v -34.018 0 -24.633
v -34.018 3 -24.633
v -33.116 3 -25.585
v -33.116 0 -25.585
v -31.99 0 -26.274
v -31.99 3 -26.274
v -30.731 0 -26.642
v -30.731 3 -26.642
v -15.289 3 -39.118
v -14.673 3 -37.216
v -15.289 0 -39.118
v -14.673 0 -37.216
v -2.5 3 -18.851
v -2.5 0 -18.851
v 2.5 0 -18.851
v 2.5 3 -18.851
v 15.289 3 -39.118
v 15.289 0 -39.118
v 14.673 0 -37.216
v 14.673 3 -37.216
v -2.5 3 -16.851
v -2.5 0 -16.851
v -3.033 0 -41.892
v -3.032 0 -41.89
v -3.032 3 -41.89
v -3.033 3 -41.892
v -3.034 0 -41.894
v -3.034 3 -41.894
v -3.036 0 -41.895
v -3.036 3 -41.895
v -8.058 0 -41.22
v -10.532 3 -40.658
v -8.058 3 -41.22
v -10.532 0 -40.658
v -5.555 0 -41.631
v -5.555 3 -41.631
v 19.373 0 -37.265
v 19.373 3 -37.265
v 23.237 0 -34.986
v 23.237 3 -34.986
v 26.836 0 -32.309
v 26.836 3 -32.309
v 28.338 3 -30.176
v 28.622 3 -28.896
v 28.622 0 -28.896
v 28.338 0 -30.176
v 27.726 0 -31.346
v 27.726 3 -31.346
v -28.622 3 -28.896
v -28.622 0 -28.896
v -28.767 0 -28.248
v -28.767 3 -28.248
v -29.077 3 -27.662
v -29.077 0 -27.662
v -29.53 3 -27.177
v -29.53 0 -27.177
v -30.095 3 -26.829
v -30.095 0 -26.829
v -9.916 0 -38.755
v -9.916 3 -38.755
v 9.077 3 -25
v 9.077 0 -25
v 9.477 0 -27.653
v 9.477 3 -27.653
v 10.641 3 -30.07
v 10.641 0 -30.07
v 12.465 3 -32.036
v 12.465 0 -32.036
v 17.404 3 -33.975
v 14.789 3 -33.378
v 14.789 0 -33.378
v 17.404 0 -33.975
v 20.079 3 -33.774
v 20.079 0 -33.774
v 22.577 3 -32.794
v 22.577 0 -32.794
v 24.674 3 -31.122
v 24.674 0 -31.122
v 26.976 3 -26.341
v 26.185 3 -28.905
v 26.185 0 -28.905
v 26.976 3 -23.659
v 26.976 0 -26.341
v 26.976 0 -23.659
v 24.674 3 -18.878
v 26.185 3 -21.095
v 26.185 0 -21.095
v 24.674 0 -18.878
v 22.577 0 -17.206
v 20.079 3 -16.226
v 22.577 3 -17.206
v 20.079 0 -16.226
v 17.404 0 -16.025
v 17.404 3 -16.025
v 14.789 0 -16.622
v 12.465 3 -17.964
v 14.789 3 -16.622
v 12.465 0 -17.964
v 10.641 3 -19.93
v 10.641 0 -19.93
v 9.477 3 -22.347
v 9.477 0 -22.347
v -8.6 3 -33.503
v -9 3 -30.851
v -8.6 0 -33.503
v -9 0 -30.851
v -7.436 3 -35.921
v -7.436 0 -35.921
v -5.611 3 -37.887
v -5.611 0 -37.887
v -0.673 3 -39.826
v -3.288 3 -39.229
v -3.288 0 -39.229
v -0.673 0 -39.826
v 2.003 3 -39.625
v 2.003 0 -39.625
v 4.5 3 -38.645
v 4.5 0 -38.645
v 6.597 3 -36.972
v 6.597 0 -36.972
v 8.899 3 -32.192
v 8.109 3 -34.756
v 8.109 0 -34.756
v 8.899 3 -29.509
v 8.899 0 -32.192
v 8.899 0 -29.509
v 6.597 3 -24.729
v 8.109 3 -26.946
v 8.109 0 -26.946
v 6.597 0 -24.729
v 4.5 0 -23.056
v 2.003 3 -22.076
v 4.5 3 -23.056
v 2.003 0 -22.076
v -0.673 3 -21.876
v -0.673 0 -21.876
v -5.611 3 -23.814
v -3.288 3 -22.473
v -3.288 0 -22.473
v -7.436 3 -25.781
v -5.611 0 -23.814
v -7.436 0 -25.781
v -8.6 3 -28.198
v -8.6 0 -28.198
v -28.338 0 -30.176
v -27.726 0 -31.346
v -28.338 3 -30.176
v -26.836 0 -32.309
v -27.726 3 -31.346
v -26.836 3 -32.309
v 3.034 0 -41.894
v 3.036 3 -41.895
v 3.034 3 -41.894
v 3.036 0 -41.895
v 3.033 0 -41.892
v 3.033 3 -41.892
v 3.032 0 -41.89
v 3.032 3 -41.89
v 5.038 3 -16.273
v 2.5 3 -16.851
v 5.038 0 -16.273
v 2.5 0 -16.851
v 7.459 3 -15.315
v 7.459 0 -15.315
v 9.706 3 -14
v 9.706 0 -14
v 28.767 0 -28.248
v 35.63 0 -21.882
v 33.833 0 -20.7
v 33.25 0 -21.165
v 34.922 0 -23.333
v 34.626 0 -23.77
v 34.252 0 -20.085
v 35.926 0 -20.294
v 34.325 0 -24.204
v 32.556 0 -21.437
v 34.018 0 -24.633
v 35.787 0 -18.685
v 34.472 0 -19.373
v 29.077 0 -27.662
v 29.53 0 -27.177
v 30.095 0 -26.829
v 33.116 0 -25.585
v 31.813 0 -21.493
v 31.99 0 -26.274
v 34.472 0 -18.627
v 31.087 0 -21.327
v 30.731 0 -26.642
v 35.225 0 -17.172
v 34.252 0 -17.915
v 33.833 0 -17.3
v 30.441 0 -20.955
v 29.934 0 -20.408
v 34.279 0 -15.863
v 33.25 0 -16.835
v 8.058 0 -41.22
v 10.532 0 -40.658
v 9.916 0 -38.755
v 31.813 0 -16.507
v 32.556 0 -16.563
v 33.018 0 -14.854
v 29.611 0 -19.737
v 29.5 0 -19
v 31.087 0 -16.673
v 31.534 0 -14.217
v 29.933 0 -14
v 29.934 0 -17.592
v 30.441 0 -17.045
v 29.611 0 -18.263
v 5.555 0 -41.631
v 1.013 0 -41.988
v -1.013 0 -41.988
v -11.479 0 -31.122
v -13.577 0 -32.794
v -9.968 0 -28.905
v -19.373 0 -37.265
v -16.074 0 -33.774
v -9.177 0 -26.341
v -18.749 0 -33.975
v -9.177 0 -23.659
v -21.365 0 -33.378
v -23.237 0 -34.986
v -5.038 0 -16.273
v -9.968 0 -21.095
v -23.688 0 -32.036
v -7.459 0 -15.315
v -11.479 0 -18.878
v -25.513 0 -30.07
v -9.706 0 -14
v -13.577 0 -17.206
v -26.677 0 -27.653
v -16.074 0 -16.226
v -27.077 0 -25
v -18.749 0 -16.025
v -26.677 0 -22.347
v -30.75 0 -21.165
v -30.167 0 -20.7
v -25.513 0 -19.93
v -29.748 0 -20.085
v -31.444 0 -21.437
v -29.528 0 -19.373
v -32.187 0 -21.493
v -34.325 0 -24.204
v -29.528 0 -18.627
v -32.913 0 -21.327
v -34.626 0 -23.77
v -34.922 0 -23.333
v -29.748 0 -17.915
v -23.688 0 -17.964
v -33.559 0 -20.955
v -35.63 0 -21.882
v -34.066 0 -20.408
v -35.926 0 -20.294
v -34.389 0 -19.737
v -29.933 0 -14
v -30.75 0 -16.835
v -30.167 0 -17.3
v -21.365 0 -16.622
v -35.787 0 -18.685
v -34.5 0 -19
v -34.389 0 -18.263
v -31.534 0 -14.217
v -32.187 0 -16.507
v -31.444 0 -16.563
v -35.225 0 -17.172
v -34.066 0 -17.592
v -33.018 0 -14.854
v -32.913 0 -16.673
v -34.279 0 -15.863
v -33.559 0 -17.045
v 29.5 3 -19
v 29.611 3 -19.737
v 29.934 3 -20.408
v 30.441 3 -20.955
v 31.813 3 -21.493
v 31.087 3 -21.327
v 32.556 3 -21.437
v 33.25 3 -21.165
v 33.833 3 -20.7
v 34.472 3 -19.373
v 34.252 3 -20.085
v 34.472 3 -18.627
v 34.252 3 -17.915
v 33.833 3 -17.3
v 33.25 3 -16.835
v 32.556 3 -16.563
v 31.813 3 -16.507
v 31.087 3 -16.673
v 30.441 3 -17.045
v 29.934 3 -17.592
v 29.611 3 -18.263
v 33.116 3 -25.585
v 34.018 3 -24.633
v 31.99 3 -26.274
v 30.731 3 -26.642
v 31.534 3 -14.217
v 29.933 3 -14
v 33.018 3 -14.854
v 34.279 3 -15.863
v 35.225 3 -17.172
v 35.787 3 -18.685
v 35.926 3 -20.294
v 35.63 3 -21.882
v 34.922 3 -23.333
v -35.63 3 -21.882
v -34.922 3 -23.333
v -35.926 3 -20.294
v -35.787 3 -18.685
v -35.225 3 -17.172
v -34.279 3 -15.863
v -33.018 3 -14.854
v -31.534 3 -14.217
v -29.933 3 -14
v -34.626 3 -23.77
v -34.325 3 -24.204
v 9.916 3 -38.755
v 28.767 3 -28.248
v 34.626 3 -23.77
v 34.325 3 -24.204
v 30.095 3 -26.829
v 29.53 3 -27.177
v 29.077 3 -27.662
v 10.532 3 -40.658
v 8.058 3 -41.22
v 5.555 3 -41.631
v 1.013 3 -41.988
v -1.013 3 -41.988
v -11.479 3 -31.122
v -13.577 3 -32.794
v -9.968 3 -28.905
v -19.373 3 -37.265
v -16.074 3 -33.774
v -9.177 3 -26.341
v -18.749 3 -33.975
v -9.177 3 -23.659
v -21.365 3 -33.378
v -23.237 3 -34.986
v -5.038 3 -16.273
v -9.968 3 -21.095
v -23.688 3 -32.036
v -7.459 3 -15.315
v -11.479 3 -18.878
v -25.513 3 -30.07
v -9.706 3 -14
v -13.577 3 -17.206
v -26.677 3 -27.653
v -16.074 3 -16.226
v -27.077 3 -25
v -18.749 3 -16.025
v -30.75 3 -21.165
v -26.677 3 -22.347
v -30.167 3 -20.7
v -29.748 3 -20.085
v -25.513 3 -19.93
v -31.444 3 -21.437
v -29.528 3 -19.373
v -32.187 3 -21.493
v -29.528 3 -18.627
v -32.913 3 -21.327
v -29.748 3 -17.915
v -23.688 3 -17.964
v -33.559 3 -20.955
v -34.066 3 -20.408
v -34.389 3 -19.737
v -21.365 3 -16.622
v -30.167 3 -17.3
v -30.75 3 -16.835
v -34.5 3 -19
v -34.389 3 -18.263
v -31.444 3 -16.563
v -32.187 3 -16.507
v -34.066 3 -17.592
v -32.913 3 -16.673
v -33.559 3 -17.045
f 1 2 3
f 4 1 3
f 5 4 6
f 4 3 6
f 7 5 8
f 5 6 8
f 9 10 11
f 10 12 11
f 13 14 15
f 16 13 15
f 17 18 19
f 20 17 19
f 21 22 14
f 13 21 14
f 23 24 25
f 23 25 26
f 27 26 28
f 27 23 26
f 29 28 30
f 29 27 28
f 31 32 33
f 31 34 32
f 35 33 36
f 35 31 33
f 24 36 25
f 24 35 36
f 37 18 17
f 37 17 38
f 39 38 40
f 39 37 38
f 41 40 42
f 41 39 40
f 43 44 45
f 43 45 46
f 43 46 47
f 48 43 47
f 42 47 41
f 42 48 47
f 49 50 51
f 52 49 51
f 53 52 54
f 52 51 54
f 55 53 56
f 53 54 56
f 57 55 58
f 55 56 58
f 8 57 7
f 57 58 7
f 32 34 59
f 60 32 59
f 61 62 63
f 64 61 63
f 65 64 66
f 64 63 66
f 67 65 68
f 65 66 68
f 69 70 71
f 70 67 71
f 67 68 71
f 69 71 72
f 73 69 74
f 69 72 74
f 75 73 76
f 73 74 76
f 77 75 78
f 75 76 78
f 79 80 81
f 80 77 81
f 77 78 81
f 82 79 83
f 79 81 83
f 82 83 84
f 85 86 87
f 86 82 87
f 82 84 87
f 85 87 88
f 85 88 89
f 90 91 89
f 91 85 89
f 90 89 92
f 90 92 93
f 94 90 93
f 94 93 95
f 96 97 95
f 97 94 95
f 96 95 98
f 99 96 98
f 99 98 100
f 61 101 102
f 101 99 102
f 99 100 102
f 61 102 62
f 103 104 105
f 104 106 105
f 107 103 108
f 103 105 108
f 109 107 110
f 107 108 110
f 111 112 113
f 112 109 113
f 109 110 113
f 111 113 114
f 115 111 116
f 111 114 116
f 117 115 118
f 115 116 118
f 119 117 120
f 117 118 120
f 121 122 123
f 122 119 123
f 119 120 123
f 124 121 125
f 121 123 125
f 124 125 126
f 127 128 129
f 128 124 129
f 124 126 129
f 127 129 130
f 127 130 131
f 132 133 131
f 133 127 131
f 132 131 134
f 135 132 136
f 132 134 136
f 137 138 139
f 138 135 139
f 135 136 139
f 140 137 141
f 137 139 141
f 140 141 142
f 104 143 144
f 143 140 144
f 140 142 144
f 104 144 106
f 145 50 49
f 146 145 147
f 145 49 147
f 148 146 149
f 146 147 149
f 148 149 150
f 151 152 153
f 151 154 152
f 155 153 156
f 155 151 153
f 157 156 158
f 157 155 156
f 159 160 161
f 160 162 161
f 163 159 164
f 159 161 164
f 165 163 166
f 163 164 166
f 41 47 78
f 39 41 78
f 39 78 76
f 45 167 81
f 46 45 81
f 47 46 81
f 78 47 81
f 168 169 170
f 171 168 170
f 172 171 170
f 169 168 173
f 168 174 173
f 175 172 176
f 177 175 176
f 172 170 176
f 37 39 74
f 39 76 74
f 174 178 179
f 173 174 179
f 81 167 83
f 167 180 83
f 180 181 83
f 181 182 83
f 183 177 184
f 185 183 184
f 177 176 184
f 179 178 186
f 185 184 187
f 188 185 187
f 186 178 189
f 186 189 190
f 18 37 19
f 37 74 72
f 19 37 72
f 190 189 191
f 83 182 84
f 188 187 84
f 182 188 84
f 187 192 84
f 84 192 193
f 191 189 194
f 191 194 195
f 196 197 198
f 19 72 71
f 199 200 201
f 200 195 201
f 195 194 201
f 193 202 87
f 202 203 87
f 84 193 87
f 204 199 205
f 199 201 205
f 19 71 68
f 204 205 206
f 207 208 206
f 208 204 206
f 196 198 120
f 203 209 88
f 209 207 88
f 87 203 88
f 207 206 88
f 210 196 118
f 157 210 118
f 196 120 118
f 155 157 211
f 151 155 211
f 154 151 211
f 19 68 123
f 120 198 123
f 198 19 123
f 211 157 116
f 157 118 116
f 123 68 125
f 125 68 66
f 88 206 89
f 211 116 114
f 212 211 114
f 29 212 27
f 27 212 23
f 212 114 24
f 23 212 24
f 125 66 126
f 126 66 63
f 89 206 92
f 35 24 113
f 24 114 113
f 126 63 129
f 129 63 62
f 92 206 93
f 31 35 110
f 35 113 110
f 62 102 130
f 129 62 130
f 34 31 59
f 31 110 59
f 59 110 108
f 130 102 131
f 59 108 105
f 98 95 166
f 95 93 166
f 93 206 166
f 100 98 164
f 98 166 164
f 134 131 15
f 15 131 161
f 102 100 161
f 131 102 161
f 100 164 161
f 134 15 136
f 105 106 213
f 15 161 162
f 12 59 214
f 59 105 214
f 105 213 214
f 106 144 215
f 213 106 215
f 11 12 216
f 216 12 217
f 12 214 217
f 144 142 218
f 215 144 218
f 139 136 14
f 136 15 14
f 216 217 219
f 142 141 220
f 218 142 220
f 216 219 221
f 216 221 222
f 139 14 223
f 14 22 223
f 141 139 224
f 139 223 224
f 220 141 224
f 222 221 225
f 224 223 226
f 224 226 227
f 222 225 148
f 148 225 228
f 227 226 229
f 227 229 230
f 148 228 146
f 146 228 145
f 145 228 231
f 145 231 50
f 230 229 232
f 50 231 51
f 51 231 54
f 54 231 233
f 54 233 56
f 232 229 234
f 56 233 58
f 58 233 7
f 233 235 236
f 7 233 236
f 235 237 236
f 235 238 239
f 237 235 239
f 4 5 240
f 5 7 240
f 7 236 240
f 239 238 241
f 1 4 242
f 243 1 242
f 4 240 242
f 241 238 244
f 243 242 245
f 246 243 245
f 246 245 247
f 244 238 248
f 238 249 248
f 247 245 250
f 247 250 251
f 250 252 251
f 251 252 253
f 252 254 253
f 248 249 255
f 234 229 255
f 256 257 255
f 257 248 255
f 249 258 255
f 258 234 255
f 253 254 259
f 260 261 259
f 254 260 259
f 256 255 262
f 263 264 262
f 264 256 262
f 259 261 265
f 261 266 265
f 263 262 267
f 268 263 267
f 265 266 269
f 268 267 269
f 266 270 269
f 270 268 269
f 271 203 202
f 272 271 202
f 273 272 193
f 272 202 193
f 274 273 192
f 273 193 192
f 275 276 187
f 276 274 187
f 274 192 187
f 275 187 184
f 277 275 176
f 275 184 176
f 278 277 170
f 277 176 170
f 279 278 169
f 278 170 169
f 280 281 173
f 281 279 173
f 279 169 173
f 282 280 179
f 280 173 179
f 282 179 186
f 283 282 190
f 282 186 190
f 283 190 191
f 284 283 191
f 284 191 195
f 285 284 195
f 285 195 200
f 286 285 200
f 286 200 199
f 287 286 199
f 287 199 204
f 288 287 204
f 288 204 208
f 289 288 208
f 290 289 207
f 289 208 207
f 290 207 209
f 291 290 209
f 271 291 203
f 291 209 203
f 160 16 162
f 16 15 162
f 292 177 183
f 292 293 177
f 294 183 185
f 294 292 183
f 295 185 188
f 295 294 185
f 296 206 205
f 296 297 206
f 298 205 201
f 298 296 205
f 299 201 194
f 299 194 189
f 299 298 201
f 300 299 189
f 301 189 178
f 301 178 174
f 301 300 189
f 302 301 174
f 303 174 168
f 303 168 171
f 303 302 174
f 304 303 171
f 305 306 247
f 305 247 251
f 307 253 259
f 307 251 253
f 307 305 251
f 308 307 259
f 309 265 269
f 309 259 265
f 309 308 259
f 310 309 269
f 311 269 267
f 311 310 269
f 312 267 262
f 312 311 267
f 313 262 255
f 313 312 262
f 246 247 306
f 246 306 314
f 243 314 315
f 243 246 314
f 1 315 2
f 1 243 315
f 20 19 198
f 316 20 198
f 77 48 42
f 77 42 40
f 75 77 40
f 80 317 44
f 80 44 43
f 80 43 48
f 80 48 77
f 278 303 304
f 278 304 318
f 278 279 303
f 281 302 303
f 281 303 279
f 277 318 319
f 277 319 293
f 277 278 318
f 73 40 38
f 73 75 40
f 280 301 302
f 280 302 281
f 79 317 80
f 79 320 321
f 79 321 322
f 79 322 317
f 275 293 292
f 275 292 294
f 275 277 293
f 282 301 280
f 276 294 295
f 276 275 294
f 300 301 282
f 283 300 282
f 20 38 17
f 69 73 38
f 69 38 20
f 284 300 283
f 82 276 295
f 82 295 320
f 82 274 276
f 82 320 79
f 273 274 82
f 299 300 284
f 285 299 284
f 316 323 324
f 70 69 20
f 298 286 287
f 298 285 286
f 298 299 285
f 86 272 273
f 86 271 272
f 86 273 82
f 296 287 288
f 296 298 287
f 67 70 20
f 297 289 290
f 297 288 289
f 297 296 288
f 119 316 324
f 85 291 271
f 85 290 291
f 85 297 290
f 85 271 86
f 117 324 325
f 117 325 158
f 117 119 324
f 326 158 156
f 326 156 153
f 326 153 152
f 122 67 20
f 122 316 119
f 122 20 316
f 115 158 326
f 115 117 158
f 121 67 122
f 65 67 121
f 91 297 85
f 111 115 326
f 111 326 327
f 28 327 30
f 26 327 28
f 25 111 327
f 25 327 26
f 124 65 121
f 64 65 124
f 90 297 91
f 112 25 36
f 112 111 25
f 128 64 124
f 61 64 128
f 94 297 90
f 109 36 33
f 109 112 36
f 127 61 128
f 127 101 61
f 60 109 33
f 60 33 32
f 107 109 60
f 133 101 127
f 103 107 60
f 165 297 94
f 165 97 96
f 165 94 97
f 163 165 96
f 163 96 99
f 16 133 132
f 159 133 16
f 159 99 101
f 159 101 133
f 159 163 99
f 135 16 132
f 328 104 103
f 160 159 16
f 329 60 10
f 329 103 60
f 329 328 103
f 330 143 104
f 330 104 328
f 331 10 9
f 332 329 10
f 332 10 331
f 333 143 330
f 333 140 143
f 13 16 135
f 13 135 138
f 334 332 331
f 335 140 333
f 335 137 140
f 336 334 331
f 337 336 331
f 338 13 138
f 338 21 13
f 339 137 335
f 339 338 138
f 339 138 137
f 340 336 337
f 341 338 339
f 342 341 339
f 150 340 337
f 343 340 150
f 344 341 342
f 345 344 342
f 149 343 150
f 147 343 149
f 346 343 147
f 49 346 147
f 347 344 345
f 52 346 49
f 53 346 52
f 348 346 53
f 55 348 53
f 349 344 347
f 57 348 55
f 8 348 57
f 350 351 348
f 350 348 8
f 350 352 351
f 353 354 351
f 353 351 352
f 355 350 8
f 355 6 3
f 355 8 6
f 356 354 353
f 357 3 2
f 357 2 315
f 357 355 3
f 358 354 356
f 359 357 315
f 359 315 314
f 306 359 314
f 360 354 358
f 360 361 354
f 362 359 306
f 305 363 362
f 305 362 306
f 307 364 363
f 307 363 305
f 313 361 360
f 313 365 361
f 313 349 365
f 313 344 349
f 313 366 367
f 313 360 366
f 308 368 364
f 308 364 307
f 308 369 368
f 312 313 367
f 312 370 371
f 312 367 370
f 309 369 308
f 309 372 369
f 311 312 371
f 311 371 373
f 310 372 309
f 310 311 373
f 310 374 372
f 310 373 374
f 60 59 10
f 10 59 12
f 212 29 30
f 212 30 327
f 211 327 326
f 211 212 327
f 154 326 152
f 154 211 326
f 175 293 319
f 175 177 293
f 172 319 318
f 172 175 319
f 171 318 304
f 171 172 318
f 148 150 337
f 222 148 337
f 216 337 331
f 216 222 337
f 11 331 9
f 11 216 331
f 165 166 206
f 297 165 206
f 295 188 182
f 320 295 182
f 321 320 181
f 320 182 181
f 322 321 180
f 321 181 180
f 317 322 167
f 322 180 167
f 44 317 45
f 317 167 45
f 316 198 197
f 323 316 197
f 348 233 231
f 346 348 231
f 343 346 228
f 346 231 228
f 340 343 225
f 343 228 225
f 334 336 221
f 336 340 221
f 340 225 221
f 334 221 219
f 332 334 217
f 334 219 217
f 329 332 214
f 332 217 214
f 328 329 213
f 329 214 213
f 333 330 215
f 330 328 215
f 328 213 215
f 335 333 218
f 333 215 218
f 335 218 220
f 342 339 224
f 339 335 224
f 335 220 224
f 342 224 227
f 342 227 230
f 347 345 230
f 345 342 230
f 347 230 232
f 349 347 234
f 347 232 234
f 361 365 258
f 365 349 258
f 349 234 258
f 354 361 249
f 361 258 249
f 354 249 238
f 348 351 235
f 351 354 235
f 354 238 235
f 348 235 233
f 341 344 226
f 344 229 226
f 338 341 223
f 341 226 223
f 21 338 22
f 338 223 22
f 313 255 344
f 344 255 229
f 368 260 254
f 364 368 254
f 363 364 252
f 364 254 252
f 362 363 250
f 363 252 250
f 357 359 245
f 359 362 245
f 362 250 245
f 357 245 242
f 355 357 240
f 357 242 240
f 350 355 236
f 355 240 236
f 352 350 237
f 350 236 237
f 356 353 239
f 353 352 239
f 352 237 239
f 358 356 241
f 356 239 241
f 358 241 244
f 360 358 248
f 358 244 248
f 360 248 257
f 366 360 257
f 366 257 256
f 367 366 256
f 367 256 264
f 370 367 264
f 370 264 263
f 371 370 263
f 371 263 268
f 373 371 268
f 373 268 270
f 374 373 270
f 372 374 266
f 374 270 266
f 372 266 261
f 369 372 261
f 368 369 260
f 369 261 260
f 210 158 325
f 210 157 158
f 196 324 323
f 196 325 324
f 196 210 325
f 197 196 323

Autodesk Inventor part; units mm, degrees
ref_plane "YZ Plane" through (0, 0, 0) normal (1, 0, 0) x (0, 1, 0)
ref_plane "XZ Plane" through (0, 0, 0) normal (0, 1, 0) x (-1, 0, 0)
ref_plane "XY Plane" through (0, 0, 0) normal (0, 0, 1) x (1, 0, 0)
sketch "Эскиз1" plane through (0, 0, 0) normal (0, 1, 0) x (-1, 0, 0)
  circle A0 centre (0, 0) radius 42
  line L0 (0, -42) -> (0, 42) construction
  circle A1 centre (18.0767, -25) radius 9
  circle A2 centre (-18.0767, -25) radius 9
  line L1 (39.598, -14) -> (-39.598, -14)
  circle A3 centre (0, -30.8507) radius 9
  circle A4 centre (0, 0) radius 30.8507 construction
  line L2 (0, 0) -> (12.9332, -39.9591) construction
  line L3 (0, 0) -> (-12.9332, -39.9591) construction
  line L4 (9.9159, -38.7553) -> (14.673, -37.2156)
  line L5 (14.673, -37.2156) -> (15.2888, -39.1184)
  line L6 (15.2888, -39.1184) -> (10.5318, -40.6581)
  line L7 (10.5318, -40.6581) -> (9.9159, -38.7553)
  line L8 (9.9159, -38.7553) -> (15.2888, -39.1184) construction
  line L9 (14.673, -37.2156) -> (10.5318, -40.6581) construction
  line L10 (-14.673, -37.2156) -> (-9.9159, -38.7553)
  line L11 (-9.9159, -38.7553) -> (-10.5318, -40.6581)
  line L12 (-10.5318, -40.6581) -> (-15.2888, -39.1184)
  line L13 (-15.2888, -39.1184) -> (-14.673, -37.2156)
  line L14 (-14.673, -37.2156) -> (-10.5318, -40.6581) construction
  line L15 (-9.9159, -38.7553) -> (-15.2888, -39.1184) construction
  line L16 (-2.5, -16.8507) -> (2.5, -16.8507)
  line L17 (2.5, -16.8507) -> (2.5, -18.8507)
  line L18 (2.5, -18.8507) -> (-2.5, -18.8507)
  line L19 (-2.5, -18.8507) -> (-2.5, -16.8507)
  line L20 (-2.5, -16.8507) -> (2.5, -18.8507) construction
  line L21 (2.5, -16.8507) -> (-2.5, -18.8507) construction
  circle A5 centre (0, 0) radius 17.0352
  circle A6 centre (0, -44.5) radius 2.5
  circle A7 centre (0, 0) radius 50
  circle A8 centre (0, -44.5) radius 4
  circle A9 centre (-32, -19) radius 2.5
  circle A10 centre (32, -19) radius 2.5
  circle A11 centre (0, 0) radius 44 construction
  circle A12 centre (0, 2) radius 44
  circle A13 centre (31.1127, -29.1127) radius 2.5
  circle A14 centre (-31.1127, -29.1127) radius 2.5
  point P0 (12.6024, -38.9369)
  point P1 (-12.6024, -38.9369)
  point P2 (0, -17.8507)
  point P3 (9.7056, -14)
  point P4 (2.5, -16.8507)
  point P5 (-9.7056, -14)
  point P6 (-15.2888, -39.1184)
  point P7 (10.5318, -40.6581)
  point P8 (-3.0315, -41.8904)
  point P9 (3.0315, -41.8904)
  point P10 (0, -42)
  point P11 (28.9734, -30.4063)
  point P12 (32.2615, -26.8923)
  point P13 (-32.2615, -26.8923)
  point P14 (-28.9734, -30.4063)
  dimension "d0" = 84
  dimension "d5" = 18
  dimension "d7" = 14
  dimension "d8" = 11
  dimension "d13" = 35.87
  dimension "d14" = 17.935
  dimension "d15" = 2
  dimension "d16" = 2
  dimension "d17" = 5
  dimension "d18" = 5
  dimension "d19" = 5
  dimension "d20" = 2
  dimension "d21" = 13
  dimension "d27" = 100
  dimension "d28" = 5
  dimension "d29" = 8
  dimension "d30" = 5
  dimension "d31" = 19
  dimension "d32" = 64
  dimension "d34" = 19
  dimension "d35" = 88
  dimension "d37" = 2
  dimension "d38" = 88
  dimension "d39" = 5
  dimension "d40" = 90
extrude "Выдавливание2" add sketch "Эскиз1" along normal blind 3 contours L1 A5 L19 L18 L17 A0 A13 L5 L4 L7 A8 L11 L10 L13 A14 | A8 A0 A12 | A12 A0 A8 | A8 A0
fillet "Сопряжение3" radius 6 2 edges at (39.598, 1.5, -14) (-39.598, 1.5, -14)
fillet "Сопряжение4" radius 5 2 edges at (-32.2615, 1.5, -26.8923) (-28.9734, 1.5, -30.4063)
fillet "Сопряжение5" radius 5 2 edges at (28.9734, 1.5, -30.4063) (32.2615, 1.5, -26.8923)
equation "\"d14\" = 0.5 * d13"
properties part number "Крепление АКБ" material "Пластик АБС"
